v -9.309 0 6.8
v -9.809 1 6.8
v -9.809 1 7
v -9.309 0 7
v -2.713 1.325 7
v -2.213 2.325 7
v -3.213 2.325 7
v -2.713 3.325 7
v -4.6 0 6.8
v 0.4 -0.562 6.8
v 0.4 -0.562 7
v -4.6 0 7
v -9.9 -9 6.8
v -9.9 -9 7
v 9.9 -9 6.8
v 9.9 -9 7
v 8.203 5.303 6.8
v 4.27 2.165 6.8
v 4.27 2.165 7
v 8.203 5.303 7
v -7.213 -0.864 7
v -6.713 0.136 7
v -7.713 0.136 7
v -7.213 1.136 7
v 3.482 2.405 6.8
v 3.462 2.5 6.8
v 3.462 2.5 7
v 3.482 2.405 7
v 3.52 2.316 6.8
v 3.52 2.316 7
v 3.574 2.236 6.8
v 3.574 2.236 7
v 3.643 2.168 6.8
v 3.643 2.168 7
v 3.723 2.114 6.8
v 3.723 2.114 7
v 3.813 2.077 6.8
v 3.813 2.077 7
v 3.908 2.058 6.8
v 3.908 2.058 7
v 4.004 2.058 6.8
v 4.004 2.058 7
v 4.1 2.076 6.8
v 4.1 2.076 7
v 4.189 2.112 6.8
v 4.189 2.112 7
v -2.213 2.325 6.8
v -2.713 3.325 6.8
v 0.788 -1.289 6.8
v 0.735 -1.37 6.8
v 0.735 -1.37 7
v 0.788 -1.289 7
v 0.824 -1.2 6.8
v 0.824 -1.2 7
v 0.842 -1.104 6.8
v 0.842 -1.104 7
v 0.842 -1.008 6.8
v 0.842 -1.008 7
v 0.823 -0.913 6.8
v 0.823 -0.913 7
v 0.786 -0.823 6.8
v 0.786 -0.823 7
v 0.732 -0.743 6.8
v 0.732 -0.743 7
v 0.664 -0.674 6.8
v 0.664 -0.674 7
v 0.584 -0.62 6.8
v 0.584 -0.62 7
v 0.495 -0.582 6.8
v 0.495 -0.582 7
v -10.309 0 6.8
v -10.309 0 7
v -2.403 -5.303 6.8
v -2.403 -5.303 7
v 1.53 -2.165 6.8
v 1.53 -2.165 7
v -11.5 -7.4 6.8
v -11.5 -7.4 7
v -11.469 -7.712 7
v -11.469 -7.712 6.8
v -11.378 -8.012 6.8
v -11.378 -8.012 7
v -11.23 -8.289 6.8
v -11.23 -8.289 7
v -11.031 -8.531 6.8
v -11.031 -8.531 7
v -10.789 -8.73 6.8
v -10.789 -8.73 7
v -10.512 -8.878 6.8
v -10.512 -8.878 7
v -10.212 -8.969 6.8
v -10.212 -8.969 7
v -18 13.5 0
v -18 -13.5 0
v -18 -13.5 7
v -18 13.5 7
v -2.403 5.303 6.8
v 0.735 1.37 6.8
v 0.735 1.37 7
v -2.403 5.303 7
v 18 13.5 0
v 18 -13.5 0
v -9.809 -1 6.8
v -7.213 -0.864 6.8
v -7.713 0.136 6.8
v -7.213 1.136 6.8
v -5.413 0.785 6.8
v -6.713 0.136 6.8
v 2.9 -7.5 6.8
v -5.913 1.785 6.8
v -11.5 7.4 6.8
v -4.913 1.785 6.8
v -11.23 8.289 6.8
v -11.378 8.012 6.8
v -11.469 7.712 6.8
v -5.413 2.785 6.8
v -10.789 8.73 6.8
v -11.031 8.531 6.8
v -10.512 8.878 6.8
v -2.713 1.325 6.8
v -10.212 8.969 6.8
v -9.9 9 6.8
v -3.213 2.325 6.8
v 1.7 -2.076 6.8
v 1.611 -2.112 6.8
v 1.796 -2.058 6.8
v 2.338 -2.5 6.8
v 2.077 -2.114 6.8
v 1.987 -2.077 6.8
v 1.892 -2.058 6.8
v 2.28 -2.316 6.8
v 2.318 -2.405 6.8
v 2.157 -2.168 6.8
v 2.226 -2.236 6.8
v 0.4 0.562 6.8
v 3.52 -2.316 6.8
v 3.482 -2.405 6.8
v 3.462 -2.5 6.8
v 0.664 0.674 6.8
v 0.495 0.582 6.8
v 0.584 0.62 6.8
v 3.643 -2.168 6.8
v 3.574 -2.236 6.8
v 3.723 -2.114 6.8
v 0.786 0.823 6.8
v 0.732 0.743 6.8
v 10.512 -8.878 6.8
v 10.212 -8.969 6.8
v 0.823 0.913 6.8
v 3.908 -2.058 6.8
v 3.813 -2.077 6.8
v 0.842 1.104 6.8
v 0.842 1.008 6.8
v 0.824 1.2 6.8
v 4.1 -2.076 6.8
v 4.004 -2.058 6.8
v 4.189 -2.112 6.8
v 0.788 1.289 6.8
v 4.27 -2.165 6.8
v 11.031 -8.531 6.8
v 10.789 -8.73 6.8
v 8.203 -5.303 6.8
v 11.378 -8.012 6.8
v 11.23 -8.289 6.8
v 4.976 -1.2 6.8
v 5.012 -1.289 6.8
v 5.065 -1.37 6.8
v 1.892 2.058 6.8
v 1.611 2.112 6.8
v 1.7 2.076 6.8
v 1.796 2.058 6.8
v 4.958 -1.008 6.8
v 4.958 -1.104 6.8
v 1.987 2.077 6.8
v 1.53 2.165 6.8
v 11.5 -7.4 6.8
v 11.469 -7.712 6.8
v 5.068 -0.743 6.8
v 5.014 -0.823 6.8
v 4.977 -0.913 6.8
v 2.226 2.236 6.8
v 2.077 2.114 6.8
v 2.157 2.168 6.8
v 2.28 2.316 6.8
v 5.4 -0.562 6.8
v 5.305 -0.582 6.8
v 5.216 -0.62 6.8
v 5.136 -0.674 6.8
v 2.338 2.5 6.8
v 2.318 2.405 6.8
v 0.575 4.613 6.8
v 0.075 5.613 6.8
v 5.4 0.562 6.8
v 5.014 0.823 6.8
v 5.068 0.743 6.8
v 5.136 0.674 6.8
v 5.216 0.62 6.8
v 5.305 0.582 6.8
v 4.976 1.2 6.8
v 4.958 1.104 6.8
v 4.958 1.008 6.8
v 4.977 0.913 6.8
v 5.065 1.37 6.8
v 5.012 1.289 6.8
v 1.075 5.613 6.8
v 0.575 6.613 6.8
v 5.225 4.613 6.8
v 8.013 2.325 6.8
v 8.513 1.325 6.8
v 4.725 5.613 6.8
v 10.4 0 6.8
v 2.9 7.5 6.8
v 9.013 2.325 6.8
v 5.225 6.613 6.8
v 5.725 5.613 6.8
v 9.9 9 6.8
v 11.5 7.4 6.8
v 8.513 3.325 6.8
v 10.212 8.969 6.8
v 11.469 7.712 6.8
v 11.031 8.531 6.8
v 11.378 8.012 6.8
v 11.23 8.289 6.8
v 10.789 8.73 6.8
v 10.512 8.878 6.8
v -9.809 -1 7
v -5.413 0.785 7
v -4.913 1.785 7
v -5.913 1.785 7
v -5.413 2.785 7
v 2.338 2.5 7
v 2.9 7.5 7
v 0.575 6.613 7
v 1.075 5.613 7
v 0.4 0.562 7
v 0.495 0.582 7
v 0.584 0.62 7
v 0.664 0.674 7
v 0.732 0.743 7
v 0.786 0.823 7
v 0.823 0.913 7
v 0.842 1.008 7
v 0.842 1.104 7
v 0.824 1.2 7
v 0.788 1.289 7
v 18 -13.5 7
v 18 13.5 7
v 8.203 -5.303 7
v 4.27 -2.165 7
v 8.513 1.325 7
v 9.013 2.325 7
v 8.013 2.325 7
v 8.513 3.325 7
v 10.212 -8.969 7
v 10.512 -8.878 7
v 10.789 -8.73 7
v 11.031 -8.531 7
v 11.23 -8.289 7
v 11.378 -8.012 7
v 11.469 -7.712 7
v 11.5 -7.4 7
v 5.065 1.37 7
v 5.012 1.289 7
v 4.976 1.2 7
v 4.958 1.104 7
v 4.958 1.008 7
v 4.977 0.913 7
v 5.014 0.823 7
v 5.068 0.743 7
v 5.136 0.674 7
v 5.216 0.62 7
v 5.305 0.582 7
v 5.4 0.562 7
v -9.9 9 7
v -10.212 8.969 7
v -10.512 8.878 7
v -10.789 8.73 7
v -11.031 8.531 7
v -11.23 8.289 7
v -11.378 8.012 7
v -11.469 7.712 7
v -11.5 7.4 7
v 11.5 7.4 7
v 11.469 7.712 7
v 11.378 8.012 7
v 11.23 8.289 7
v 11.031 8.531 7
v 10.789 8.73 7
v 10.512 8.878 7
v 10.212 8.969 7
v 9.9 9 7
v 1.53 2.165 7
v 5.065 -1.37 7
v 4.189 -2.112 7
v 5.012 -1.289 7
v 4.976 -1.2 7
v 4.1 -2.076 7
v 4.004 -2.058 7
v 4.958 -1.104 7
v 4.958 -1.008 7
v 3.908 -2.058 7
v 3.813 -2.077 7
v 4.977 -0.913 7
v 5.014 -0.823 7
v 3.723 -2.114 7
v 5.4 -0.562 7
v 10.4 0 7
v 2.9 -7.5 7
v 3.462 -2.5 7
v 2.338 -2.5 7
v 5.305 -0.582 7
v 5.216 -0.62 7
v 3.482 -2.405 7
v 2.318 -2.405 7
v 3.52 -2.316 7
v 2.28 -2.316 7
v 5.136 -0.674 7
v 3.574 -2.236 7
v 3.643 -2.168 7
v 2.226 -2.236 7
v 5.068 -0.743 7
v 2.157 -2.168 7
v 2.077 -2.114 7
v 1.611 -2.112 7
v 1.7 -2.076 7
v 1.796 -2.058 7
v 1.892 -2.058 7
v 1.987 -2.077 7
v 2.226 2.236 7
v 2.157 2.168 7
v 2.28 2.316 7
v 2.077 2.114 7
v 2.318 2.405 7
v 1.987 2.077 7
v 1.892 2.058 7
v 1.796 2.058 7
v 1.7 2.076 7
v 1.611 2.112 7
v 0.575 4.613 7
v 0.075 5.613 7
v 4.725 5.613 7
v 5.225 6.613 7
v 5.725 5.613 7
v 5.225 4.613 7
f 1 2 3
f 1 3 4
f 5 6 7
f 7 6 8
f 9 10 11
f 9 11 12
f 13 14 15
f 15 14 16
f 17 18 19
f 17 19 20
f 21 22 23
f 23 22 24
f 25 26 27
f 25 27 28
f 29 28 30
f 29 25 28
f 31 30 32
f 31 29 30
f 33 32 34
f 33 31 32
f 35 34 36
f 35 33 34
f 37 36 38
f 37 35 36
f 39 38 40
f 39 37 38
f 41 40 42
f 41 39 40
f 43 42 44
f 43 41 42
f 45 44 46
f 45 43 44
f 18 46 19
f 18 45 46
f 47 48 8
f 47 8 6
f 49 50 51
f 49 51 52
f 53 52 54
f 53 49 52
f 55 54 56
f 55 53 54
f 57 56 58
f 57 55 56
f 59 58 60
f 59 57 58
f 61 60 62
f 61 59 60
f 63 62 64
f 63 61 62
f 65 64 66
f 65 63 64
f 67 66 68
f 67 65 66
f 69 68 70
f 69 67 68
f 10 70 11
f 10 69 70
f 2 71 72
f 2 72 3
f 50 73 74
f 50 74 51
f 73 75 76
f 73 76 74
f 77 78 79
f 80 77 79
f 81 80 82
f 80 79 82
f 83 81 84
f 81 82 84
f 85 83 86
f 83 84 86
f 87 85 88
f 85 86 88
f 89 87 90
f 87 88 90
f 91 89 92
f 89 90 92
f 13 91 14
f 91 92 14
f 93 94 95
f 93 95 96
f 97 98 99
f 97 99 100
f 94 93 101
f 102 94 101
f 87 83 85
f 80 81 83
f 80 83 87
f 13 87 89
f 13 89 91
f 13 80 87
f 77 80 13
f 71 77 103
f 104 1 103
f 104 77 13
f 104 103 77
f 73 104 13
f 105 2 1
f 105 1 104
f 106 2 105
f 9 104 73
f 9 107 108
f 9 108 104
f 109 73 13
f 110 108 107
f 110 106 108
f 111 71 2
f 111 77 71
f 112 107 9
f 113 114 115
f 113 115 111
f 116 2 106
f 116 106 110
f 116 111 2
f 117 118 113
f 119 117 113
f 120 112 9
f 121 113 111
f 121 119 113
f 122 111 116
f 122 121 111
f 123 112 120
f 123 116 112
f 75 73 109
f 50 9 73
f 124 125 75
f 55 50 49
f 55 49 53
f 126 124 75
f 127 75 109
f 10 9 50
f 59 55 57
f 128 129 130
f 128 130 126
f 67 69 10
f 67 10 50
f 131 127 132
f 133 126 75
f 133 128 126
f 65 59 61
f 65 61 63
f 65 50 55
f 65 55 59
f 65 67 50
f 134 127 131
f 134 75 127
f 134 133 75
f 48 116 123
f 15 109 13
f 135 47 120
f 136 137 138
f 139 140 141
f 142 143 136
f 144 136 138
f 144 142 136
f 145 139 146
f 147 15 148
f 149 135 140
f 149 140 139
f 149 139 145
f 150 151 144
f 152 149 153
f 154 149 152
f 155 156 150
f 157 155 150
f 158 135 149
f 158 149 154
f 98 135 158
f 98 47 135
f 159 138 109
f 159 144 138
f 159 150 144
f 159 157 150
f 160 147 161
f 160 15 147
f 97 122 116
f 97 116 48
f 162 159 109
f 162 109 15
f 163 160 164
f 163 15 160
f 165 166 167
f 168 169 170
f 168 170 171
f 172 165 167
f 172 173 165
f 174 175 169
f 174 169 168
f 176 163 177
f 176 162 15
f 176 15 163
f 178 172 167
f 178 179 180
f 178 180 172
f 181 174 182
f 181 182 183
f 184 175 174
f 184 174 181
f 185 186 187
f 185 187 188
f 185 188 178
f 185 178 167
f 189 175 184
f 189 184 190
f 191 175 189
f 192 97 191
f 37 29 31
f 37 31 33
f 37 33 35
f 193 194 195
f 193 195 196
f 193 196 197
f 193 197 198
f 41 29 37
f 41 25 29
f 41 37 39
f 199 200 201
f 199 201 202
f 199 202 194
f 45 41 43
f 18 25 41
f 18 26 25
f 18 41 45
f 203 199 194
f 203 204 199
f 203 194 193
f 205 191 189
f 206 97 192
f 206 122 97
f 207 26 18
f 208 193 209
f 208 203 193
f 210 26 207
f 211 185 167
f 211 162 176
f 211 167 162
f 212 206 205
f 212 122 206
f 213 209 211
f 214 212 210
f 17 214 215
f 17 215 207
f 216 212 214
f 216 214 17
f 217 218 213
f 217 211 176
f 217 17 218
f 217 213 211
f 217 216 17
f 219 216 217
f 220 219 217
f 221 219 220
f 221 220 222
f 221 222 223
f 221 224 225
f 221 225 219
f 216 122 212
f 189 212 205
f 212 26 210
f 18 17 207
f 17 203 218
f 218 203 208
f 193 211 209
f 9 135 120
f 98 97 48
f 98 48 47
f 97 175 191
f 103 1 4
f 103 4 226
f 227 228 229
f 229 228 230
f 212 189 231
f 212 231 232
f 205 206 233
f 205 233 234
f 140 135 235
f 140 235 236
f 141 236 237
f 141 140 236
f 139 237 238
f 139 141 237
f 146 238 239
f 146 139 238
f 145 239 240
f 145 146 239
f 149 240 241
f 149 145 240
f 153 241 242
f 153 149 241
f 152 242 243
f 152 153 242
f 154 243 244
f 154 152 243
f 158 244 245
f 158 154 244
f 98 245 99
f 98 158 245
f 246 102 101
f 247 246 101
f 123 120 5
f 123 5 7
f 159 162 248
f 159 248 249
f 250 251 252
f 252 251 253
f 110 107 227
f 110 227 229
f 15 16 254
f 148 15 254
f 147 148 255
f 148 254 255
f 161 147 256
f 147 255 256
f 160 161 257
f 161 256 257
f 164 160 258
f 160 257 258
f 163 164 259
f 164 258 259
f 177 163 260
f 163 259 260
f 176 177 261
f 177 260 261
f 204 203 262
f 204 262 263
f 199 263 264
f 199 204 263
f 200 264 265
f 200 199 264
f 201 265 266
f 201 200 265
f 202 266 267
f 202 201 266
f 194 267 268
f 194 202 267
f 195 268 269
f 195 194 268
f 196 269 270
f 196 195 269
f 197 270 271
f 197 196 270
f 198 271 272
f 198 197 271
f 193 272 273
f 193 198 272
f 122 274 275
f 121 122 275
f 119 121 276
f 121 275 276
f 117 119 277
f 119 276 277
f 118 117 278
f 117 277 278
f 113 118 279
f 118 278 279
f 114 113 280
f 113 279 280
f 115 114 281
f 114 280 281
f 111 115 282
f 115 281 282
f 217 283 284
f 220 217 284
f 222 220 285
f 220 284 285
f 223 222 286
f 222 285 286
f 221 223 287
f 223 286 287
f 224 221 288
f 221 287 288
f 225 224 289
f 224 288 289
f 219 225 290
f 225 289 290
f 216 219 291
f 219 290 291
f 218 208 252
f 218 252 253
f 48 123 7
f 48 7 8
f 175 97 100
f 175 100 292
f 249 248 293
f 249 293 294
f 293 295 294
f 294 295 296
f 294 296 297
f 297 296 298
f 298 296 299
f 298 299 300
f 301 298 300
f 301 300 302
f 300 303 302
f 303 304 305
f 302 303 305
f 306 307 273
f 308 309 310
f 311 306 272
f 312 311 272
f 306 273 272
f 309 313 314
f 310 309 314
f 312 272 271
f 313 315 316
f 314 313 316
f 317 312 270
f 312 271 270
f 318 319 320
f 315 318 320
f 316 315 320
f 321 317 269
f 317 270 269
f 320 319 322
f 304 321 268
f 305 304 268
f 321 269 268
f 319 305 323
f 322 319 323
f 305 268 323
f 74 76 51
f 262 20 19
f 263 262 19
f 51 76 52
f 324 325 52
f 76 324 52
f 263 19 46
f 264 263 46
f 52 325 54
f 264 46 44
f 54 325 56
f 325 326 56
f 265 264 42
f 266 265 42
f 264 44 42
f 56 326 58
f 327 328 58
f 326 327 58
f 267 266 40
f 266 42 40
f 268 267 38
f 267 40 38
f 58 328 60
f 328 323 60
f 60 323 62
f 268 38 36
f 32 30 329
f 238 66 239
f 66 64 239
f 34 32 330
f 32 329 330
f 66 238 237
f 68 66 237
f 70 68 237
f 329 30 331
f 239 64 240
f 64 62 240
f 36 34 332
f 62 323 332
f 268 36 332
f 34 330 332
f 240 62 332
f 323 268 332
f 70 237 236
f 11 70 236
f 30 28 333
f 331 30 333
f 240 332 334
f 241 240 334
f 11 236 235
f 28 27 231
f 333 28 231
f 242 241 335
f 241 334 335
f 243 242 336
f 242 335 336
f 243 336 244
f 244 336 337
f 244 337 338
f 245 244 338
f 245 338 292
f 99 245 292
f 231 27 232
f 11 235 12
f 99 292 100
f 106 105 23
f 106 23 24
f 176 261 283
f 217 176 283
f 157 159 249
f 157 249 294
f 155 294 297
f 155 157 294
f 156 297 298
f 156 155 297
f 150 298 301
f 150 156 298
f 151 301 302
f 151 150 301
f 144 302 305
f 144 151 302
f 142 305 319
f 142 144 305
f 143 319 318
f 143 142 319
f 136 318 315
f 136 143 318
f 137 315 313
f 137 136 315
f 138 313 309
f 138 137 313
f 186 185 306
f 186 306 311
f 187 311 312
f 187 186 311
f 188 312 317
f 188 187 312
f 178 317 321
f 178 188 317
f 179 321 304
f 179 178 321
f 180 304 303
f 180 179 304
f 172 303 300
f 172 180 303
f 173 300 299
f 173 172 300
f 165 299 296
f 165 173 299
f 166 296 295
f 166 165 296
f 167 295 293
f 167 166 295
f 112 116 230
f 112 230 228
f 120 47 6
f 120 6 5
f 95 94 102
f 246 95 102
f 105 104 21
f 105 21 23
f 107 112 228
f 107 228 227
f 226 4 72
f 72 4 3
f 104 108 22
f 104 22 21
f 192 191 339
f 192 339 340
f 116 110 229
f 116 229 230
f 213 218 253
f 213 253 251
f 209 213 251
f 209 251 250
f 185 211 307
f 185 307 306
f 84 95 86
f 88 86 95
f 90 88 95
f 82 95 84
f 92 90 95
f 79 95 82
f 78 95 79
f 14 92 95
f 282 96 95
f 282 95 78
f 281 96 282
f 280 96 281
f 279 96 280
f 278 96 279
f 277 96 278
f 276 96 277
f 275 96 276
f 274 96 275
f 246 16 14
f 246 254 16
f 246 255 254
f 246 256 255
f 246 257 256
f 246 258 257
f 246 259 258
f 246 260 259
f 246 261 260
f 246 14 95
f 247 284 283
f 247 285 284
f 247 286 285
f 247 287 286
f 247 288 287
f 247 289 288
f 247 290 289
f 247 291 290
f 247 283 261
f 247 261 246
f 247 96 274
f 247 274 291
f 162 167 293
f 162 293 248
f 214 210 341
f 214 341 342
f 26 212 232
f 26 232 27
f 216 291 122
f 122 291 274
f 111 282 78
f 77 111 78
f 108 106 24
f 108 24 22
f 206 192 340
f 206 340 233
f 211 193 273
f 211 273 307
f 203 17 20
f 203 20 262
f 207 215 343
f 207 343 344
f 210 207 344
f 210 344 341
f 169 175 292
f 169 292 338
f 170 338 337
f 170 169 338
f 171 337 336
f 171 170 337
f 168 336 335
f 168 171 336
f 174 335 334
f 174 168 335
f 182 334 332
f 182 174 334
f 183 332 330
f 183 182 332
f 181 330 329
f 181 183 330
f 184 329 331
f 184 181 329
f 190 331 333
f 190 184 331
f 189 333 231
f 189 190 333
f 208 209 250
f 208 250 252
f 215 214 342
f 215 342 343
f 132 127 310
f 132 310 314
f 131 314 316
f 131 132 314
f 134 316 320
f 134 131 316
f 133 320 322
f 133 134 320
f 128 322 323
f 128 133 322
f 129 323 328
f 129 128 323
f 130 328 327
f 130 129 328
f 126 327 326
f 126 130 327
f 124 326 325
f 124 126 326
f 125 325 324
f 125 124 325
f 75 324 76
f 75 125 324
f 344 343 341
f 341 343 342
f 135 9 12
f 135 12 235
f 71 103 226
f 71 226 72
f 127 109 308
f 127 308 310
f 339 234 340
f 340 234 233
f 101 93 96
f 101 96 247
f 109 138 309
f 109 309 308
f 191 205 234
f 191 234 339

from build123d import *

# Parameters (mm, degrees)
SKETCH1_W           = 36
SKETCH1_H           = 27
BOSS_EXTRUDE1_DEPTH = 7
CUT_EXTRUDE1_DEPTH  = 0.2
BOSS_EXTRUDE2_DEPTH = 0.2
BOSS_EXTRUDE3_DEPTH = 0.2


with BuildPart() as part:
    # Sketch1 → Boss-Extrude1 (new body)
    with BuildSketch(Plane.XY):
        Rectangle(SKETCH1_W, SKETCH1_H)
    extrude(amount=BOSS_EXTRUDE1_DEPTH)

    # Sketch2 → Cut-Extrude1 (cut)
    with BuildSketch(Plane.XY.offset(7)):
        with BuildLine():
            Line((-9.9, -9), (9.9, -9))
            ThreePointArc((9.9, -9), (11.03137085, -8.53137085), (11.5, -7.4))
            Line((11.5, -7.4), (11.5, 7.4))
            ThreePointArc((11.5, 7.4), (11.03137085, 8.53137085), (9.9, 9))
            Line((9.9, 9), (-9.9, 9))
            ThreePointArc((-9.9, 9), (-11.03137085, 8.53137085), (-11.5, 7.4))
            Line((-11.5, 7.4), (-11.5, -7.4))
            ThreePointArc((-11.5, -7.4), (-11.03137085, -8.53137085), (-9.9, -9))
        make_face()
    extrude(amount=-CUT_EXTRUDE1_DEPTH, mode=Mode.SUBTRACT)

    # Sketch3 → Boss-Extrude2 (add)
    with BuildSketch(Plane.XY.offset(6.8)):
        with BuildLine():
            Line((2.9, 7.5), (3.461670446, 2.49974195))
            ThreePointArc((3.461670446, 2.49974195), (3.767203859, 2.093615319), (4.270423503, 2.164745466))
            Line((4.270423503, 2.164745466), (8.203300859, 5.303300859))
            Line((8.203300859, 5.303300859), (5.064745466, 1.370423503))
            ThreePointArc((5.064745466, 1.370423503), (4.993615319, 0.867203859), (5.39974195, 0.561670446))
            Line((5.39974195, 0.561670446), (10.4, 0))
            Line((10.4, 0), (5.39974195, -0.561670446))
            ThreePointArc((5.39974195, -0.561670446), (4.993615319, -0.867203859), (5.064745466, -1.370423503))
            Line((5.064745466, -1.370423503), (8.203300859, -5.303300859))
            Line((8.203300859, -5.303300859), (4.270423503, -2.164745466))
            ThreePointArc((4.270423503, -2.164745466), (3.767203859, -2.093615319), (3.461670446, -2.49974195))
            Line((3.461670446, -2.49974195), (2.9, -7.5))
            Line((2.9, -7.5), (2.338329554, -2.49974195))
            ThreePointArc((2.338329554, -2.49974195), (2.032796141, -2.093615319), (1.529576497, -2.164745466))
            Line((1.529576497, -2.164745466), (-2.403300859, -5.303300859))
            Line((-2.403300859, -5.303300859), (0.735254534, -1.370423503))
            ThreePointArc((0.735254534, -1.370423503), (0.806384681, -0.867203859), (0.40025805, -0.561670446))
            Line((0.40025805, -0.561670446), (-4.6, 0))
            Line((-4.6, 0), (0.40025805, 0.561670446))
            ThreePointArc((0.40025805, 0.561670446), (0.806384681, 0.867203859), (0.735254534, 1.370423503))
            Line((0.735254534, 1.370423503), (-2.403300859, 5.303300859))
            Line((-2.403300859, 5.303300859), (1.529576497, 2.164745466))
            ThreePointArc((1.529576497, 2.164745466), (2.032796141, 2.093615319), (2.338329554, 2.49974195))
            Line((2.338329554, 2.49974195), (2.9, 7.5))
        make_face()
    extrude(amount=BOSS_EXTRUDE2_DEPTH)

    # Sketch5 → Boss-Extrude3 (add)
    with BuildSketch(Plane.XY.offset(6.8)):
        Polygon((-5.413360388, 2.785130003), (-4.913360388, 1.785130003), (-5.413360388, 0.785130003), (-5.913360388, 1.785130003), align=None)
        Polygon((8.513360388, 3.325130003), (9.013360388, 2.325130003), (8.513360388, 1.325130003), (8.013360388, 2.325130003), align=None)
        Polygon((4.725130003, 5.613360388), (5.225130003, 6.613360388), (5.725130003, 5.613360388), (5.225130003, 4.613360388), align=None)
        Polygon((0.574869997, 6.613360388), (1.074869997, 5.613360388), (0.574869997, 4.613360388), (0.074869997, 5.613360388), align=None)
        Polygon((-2.713360388, 3.325130003), (-2.213360388, 2.325130003), (-2.713360388, 1.325130003), (-3.213360388, 2.325130003), align=None)
        Polygon((-7.213360388, 1.135887753), (-6.713360388, 0.135887753), (-7.213360388, -0.864112247), (-7.713360388, 0.135887753), align=None)
        Polygon((-9.808959232, 1), (-9.308959232, 0), (-9.808959232, -1), (-10.308959232, 0), align=None)
    extrude(amount=BOSS_EXTRUDE3_DEPTH)


solid = part.part
